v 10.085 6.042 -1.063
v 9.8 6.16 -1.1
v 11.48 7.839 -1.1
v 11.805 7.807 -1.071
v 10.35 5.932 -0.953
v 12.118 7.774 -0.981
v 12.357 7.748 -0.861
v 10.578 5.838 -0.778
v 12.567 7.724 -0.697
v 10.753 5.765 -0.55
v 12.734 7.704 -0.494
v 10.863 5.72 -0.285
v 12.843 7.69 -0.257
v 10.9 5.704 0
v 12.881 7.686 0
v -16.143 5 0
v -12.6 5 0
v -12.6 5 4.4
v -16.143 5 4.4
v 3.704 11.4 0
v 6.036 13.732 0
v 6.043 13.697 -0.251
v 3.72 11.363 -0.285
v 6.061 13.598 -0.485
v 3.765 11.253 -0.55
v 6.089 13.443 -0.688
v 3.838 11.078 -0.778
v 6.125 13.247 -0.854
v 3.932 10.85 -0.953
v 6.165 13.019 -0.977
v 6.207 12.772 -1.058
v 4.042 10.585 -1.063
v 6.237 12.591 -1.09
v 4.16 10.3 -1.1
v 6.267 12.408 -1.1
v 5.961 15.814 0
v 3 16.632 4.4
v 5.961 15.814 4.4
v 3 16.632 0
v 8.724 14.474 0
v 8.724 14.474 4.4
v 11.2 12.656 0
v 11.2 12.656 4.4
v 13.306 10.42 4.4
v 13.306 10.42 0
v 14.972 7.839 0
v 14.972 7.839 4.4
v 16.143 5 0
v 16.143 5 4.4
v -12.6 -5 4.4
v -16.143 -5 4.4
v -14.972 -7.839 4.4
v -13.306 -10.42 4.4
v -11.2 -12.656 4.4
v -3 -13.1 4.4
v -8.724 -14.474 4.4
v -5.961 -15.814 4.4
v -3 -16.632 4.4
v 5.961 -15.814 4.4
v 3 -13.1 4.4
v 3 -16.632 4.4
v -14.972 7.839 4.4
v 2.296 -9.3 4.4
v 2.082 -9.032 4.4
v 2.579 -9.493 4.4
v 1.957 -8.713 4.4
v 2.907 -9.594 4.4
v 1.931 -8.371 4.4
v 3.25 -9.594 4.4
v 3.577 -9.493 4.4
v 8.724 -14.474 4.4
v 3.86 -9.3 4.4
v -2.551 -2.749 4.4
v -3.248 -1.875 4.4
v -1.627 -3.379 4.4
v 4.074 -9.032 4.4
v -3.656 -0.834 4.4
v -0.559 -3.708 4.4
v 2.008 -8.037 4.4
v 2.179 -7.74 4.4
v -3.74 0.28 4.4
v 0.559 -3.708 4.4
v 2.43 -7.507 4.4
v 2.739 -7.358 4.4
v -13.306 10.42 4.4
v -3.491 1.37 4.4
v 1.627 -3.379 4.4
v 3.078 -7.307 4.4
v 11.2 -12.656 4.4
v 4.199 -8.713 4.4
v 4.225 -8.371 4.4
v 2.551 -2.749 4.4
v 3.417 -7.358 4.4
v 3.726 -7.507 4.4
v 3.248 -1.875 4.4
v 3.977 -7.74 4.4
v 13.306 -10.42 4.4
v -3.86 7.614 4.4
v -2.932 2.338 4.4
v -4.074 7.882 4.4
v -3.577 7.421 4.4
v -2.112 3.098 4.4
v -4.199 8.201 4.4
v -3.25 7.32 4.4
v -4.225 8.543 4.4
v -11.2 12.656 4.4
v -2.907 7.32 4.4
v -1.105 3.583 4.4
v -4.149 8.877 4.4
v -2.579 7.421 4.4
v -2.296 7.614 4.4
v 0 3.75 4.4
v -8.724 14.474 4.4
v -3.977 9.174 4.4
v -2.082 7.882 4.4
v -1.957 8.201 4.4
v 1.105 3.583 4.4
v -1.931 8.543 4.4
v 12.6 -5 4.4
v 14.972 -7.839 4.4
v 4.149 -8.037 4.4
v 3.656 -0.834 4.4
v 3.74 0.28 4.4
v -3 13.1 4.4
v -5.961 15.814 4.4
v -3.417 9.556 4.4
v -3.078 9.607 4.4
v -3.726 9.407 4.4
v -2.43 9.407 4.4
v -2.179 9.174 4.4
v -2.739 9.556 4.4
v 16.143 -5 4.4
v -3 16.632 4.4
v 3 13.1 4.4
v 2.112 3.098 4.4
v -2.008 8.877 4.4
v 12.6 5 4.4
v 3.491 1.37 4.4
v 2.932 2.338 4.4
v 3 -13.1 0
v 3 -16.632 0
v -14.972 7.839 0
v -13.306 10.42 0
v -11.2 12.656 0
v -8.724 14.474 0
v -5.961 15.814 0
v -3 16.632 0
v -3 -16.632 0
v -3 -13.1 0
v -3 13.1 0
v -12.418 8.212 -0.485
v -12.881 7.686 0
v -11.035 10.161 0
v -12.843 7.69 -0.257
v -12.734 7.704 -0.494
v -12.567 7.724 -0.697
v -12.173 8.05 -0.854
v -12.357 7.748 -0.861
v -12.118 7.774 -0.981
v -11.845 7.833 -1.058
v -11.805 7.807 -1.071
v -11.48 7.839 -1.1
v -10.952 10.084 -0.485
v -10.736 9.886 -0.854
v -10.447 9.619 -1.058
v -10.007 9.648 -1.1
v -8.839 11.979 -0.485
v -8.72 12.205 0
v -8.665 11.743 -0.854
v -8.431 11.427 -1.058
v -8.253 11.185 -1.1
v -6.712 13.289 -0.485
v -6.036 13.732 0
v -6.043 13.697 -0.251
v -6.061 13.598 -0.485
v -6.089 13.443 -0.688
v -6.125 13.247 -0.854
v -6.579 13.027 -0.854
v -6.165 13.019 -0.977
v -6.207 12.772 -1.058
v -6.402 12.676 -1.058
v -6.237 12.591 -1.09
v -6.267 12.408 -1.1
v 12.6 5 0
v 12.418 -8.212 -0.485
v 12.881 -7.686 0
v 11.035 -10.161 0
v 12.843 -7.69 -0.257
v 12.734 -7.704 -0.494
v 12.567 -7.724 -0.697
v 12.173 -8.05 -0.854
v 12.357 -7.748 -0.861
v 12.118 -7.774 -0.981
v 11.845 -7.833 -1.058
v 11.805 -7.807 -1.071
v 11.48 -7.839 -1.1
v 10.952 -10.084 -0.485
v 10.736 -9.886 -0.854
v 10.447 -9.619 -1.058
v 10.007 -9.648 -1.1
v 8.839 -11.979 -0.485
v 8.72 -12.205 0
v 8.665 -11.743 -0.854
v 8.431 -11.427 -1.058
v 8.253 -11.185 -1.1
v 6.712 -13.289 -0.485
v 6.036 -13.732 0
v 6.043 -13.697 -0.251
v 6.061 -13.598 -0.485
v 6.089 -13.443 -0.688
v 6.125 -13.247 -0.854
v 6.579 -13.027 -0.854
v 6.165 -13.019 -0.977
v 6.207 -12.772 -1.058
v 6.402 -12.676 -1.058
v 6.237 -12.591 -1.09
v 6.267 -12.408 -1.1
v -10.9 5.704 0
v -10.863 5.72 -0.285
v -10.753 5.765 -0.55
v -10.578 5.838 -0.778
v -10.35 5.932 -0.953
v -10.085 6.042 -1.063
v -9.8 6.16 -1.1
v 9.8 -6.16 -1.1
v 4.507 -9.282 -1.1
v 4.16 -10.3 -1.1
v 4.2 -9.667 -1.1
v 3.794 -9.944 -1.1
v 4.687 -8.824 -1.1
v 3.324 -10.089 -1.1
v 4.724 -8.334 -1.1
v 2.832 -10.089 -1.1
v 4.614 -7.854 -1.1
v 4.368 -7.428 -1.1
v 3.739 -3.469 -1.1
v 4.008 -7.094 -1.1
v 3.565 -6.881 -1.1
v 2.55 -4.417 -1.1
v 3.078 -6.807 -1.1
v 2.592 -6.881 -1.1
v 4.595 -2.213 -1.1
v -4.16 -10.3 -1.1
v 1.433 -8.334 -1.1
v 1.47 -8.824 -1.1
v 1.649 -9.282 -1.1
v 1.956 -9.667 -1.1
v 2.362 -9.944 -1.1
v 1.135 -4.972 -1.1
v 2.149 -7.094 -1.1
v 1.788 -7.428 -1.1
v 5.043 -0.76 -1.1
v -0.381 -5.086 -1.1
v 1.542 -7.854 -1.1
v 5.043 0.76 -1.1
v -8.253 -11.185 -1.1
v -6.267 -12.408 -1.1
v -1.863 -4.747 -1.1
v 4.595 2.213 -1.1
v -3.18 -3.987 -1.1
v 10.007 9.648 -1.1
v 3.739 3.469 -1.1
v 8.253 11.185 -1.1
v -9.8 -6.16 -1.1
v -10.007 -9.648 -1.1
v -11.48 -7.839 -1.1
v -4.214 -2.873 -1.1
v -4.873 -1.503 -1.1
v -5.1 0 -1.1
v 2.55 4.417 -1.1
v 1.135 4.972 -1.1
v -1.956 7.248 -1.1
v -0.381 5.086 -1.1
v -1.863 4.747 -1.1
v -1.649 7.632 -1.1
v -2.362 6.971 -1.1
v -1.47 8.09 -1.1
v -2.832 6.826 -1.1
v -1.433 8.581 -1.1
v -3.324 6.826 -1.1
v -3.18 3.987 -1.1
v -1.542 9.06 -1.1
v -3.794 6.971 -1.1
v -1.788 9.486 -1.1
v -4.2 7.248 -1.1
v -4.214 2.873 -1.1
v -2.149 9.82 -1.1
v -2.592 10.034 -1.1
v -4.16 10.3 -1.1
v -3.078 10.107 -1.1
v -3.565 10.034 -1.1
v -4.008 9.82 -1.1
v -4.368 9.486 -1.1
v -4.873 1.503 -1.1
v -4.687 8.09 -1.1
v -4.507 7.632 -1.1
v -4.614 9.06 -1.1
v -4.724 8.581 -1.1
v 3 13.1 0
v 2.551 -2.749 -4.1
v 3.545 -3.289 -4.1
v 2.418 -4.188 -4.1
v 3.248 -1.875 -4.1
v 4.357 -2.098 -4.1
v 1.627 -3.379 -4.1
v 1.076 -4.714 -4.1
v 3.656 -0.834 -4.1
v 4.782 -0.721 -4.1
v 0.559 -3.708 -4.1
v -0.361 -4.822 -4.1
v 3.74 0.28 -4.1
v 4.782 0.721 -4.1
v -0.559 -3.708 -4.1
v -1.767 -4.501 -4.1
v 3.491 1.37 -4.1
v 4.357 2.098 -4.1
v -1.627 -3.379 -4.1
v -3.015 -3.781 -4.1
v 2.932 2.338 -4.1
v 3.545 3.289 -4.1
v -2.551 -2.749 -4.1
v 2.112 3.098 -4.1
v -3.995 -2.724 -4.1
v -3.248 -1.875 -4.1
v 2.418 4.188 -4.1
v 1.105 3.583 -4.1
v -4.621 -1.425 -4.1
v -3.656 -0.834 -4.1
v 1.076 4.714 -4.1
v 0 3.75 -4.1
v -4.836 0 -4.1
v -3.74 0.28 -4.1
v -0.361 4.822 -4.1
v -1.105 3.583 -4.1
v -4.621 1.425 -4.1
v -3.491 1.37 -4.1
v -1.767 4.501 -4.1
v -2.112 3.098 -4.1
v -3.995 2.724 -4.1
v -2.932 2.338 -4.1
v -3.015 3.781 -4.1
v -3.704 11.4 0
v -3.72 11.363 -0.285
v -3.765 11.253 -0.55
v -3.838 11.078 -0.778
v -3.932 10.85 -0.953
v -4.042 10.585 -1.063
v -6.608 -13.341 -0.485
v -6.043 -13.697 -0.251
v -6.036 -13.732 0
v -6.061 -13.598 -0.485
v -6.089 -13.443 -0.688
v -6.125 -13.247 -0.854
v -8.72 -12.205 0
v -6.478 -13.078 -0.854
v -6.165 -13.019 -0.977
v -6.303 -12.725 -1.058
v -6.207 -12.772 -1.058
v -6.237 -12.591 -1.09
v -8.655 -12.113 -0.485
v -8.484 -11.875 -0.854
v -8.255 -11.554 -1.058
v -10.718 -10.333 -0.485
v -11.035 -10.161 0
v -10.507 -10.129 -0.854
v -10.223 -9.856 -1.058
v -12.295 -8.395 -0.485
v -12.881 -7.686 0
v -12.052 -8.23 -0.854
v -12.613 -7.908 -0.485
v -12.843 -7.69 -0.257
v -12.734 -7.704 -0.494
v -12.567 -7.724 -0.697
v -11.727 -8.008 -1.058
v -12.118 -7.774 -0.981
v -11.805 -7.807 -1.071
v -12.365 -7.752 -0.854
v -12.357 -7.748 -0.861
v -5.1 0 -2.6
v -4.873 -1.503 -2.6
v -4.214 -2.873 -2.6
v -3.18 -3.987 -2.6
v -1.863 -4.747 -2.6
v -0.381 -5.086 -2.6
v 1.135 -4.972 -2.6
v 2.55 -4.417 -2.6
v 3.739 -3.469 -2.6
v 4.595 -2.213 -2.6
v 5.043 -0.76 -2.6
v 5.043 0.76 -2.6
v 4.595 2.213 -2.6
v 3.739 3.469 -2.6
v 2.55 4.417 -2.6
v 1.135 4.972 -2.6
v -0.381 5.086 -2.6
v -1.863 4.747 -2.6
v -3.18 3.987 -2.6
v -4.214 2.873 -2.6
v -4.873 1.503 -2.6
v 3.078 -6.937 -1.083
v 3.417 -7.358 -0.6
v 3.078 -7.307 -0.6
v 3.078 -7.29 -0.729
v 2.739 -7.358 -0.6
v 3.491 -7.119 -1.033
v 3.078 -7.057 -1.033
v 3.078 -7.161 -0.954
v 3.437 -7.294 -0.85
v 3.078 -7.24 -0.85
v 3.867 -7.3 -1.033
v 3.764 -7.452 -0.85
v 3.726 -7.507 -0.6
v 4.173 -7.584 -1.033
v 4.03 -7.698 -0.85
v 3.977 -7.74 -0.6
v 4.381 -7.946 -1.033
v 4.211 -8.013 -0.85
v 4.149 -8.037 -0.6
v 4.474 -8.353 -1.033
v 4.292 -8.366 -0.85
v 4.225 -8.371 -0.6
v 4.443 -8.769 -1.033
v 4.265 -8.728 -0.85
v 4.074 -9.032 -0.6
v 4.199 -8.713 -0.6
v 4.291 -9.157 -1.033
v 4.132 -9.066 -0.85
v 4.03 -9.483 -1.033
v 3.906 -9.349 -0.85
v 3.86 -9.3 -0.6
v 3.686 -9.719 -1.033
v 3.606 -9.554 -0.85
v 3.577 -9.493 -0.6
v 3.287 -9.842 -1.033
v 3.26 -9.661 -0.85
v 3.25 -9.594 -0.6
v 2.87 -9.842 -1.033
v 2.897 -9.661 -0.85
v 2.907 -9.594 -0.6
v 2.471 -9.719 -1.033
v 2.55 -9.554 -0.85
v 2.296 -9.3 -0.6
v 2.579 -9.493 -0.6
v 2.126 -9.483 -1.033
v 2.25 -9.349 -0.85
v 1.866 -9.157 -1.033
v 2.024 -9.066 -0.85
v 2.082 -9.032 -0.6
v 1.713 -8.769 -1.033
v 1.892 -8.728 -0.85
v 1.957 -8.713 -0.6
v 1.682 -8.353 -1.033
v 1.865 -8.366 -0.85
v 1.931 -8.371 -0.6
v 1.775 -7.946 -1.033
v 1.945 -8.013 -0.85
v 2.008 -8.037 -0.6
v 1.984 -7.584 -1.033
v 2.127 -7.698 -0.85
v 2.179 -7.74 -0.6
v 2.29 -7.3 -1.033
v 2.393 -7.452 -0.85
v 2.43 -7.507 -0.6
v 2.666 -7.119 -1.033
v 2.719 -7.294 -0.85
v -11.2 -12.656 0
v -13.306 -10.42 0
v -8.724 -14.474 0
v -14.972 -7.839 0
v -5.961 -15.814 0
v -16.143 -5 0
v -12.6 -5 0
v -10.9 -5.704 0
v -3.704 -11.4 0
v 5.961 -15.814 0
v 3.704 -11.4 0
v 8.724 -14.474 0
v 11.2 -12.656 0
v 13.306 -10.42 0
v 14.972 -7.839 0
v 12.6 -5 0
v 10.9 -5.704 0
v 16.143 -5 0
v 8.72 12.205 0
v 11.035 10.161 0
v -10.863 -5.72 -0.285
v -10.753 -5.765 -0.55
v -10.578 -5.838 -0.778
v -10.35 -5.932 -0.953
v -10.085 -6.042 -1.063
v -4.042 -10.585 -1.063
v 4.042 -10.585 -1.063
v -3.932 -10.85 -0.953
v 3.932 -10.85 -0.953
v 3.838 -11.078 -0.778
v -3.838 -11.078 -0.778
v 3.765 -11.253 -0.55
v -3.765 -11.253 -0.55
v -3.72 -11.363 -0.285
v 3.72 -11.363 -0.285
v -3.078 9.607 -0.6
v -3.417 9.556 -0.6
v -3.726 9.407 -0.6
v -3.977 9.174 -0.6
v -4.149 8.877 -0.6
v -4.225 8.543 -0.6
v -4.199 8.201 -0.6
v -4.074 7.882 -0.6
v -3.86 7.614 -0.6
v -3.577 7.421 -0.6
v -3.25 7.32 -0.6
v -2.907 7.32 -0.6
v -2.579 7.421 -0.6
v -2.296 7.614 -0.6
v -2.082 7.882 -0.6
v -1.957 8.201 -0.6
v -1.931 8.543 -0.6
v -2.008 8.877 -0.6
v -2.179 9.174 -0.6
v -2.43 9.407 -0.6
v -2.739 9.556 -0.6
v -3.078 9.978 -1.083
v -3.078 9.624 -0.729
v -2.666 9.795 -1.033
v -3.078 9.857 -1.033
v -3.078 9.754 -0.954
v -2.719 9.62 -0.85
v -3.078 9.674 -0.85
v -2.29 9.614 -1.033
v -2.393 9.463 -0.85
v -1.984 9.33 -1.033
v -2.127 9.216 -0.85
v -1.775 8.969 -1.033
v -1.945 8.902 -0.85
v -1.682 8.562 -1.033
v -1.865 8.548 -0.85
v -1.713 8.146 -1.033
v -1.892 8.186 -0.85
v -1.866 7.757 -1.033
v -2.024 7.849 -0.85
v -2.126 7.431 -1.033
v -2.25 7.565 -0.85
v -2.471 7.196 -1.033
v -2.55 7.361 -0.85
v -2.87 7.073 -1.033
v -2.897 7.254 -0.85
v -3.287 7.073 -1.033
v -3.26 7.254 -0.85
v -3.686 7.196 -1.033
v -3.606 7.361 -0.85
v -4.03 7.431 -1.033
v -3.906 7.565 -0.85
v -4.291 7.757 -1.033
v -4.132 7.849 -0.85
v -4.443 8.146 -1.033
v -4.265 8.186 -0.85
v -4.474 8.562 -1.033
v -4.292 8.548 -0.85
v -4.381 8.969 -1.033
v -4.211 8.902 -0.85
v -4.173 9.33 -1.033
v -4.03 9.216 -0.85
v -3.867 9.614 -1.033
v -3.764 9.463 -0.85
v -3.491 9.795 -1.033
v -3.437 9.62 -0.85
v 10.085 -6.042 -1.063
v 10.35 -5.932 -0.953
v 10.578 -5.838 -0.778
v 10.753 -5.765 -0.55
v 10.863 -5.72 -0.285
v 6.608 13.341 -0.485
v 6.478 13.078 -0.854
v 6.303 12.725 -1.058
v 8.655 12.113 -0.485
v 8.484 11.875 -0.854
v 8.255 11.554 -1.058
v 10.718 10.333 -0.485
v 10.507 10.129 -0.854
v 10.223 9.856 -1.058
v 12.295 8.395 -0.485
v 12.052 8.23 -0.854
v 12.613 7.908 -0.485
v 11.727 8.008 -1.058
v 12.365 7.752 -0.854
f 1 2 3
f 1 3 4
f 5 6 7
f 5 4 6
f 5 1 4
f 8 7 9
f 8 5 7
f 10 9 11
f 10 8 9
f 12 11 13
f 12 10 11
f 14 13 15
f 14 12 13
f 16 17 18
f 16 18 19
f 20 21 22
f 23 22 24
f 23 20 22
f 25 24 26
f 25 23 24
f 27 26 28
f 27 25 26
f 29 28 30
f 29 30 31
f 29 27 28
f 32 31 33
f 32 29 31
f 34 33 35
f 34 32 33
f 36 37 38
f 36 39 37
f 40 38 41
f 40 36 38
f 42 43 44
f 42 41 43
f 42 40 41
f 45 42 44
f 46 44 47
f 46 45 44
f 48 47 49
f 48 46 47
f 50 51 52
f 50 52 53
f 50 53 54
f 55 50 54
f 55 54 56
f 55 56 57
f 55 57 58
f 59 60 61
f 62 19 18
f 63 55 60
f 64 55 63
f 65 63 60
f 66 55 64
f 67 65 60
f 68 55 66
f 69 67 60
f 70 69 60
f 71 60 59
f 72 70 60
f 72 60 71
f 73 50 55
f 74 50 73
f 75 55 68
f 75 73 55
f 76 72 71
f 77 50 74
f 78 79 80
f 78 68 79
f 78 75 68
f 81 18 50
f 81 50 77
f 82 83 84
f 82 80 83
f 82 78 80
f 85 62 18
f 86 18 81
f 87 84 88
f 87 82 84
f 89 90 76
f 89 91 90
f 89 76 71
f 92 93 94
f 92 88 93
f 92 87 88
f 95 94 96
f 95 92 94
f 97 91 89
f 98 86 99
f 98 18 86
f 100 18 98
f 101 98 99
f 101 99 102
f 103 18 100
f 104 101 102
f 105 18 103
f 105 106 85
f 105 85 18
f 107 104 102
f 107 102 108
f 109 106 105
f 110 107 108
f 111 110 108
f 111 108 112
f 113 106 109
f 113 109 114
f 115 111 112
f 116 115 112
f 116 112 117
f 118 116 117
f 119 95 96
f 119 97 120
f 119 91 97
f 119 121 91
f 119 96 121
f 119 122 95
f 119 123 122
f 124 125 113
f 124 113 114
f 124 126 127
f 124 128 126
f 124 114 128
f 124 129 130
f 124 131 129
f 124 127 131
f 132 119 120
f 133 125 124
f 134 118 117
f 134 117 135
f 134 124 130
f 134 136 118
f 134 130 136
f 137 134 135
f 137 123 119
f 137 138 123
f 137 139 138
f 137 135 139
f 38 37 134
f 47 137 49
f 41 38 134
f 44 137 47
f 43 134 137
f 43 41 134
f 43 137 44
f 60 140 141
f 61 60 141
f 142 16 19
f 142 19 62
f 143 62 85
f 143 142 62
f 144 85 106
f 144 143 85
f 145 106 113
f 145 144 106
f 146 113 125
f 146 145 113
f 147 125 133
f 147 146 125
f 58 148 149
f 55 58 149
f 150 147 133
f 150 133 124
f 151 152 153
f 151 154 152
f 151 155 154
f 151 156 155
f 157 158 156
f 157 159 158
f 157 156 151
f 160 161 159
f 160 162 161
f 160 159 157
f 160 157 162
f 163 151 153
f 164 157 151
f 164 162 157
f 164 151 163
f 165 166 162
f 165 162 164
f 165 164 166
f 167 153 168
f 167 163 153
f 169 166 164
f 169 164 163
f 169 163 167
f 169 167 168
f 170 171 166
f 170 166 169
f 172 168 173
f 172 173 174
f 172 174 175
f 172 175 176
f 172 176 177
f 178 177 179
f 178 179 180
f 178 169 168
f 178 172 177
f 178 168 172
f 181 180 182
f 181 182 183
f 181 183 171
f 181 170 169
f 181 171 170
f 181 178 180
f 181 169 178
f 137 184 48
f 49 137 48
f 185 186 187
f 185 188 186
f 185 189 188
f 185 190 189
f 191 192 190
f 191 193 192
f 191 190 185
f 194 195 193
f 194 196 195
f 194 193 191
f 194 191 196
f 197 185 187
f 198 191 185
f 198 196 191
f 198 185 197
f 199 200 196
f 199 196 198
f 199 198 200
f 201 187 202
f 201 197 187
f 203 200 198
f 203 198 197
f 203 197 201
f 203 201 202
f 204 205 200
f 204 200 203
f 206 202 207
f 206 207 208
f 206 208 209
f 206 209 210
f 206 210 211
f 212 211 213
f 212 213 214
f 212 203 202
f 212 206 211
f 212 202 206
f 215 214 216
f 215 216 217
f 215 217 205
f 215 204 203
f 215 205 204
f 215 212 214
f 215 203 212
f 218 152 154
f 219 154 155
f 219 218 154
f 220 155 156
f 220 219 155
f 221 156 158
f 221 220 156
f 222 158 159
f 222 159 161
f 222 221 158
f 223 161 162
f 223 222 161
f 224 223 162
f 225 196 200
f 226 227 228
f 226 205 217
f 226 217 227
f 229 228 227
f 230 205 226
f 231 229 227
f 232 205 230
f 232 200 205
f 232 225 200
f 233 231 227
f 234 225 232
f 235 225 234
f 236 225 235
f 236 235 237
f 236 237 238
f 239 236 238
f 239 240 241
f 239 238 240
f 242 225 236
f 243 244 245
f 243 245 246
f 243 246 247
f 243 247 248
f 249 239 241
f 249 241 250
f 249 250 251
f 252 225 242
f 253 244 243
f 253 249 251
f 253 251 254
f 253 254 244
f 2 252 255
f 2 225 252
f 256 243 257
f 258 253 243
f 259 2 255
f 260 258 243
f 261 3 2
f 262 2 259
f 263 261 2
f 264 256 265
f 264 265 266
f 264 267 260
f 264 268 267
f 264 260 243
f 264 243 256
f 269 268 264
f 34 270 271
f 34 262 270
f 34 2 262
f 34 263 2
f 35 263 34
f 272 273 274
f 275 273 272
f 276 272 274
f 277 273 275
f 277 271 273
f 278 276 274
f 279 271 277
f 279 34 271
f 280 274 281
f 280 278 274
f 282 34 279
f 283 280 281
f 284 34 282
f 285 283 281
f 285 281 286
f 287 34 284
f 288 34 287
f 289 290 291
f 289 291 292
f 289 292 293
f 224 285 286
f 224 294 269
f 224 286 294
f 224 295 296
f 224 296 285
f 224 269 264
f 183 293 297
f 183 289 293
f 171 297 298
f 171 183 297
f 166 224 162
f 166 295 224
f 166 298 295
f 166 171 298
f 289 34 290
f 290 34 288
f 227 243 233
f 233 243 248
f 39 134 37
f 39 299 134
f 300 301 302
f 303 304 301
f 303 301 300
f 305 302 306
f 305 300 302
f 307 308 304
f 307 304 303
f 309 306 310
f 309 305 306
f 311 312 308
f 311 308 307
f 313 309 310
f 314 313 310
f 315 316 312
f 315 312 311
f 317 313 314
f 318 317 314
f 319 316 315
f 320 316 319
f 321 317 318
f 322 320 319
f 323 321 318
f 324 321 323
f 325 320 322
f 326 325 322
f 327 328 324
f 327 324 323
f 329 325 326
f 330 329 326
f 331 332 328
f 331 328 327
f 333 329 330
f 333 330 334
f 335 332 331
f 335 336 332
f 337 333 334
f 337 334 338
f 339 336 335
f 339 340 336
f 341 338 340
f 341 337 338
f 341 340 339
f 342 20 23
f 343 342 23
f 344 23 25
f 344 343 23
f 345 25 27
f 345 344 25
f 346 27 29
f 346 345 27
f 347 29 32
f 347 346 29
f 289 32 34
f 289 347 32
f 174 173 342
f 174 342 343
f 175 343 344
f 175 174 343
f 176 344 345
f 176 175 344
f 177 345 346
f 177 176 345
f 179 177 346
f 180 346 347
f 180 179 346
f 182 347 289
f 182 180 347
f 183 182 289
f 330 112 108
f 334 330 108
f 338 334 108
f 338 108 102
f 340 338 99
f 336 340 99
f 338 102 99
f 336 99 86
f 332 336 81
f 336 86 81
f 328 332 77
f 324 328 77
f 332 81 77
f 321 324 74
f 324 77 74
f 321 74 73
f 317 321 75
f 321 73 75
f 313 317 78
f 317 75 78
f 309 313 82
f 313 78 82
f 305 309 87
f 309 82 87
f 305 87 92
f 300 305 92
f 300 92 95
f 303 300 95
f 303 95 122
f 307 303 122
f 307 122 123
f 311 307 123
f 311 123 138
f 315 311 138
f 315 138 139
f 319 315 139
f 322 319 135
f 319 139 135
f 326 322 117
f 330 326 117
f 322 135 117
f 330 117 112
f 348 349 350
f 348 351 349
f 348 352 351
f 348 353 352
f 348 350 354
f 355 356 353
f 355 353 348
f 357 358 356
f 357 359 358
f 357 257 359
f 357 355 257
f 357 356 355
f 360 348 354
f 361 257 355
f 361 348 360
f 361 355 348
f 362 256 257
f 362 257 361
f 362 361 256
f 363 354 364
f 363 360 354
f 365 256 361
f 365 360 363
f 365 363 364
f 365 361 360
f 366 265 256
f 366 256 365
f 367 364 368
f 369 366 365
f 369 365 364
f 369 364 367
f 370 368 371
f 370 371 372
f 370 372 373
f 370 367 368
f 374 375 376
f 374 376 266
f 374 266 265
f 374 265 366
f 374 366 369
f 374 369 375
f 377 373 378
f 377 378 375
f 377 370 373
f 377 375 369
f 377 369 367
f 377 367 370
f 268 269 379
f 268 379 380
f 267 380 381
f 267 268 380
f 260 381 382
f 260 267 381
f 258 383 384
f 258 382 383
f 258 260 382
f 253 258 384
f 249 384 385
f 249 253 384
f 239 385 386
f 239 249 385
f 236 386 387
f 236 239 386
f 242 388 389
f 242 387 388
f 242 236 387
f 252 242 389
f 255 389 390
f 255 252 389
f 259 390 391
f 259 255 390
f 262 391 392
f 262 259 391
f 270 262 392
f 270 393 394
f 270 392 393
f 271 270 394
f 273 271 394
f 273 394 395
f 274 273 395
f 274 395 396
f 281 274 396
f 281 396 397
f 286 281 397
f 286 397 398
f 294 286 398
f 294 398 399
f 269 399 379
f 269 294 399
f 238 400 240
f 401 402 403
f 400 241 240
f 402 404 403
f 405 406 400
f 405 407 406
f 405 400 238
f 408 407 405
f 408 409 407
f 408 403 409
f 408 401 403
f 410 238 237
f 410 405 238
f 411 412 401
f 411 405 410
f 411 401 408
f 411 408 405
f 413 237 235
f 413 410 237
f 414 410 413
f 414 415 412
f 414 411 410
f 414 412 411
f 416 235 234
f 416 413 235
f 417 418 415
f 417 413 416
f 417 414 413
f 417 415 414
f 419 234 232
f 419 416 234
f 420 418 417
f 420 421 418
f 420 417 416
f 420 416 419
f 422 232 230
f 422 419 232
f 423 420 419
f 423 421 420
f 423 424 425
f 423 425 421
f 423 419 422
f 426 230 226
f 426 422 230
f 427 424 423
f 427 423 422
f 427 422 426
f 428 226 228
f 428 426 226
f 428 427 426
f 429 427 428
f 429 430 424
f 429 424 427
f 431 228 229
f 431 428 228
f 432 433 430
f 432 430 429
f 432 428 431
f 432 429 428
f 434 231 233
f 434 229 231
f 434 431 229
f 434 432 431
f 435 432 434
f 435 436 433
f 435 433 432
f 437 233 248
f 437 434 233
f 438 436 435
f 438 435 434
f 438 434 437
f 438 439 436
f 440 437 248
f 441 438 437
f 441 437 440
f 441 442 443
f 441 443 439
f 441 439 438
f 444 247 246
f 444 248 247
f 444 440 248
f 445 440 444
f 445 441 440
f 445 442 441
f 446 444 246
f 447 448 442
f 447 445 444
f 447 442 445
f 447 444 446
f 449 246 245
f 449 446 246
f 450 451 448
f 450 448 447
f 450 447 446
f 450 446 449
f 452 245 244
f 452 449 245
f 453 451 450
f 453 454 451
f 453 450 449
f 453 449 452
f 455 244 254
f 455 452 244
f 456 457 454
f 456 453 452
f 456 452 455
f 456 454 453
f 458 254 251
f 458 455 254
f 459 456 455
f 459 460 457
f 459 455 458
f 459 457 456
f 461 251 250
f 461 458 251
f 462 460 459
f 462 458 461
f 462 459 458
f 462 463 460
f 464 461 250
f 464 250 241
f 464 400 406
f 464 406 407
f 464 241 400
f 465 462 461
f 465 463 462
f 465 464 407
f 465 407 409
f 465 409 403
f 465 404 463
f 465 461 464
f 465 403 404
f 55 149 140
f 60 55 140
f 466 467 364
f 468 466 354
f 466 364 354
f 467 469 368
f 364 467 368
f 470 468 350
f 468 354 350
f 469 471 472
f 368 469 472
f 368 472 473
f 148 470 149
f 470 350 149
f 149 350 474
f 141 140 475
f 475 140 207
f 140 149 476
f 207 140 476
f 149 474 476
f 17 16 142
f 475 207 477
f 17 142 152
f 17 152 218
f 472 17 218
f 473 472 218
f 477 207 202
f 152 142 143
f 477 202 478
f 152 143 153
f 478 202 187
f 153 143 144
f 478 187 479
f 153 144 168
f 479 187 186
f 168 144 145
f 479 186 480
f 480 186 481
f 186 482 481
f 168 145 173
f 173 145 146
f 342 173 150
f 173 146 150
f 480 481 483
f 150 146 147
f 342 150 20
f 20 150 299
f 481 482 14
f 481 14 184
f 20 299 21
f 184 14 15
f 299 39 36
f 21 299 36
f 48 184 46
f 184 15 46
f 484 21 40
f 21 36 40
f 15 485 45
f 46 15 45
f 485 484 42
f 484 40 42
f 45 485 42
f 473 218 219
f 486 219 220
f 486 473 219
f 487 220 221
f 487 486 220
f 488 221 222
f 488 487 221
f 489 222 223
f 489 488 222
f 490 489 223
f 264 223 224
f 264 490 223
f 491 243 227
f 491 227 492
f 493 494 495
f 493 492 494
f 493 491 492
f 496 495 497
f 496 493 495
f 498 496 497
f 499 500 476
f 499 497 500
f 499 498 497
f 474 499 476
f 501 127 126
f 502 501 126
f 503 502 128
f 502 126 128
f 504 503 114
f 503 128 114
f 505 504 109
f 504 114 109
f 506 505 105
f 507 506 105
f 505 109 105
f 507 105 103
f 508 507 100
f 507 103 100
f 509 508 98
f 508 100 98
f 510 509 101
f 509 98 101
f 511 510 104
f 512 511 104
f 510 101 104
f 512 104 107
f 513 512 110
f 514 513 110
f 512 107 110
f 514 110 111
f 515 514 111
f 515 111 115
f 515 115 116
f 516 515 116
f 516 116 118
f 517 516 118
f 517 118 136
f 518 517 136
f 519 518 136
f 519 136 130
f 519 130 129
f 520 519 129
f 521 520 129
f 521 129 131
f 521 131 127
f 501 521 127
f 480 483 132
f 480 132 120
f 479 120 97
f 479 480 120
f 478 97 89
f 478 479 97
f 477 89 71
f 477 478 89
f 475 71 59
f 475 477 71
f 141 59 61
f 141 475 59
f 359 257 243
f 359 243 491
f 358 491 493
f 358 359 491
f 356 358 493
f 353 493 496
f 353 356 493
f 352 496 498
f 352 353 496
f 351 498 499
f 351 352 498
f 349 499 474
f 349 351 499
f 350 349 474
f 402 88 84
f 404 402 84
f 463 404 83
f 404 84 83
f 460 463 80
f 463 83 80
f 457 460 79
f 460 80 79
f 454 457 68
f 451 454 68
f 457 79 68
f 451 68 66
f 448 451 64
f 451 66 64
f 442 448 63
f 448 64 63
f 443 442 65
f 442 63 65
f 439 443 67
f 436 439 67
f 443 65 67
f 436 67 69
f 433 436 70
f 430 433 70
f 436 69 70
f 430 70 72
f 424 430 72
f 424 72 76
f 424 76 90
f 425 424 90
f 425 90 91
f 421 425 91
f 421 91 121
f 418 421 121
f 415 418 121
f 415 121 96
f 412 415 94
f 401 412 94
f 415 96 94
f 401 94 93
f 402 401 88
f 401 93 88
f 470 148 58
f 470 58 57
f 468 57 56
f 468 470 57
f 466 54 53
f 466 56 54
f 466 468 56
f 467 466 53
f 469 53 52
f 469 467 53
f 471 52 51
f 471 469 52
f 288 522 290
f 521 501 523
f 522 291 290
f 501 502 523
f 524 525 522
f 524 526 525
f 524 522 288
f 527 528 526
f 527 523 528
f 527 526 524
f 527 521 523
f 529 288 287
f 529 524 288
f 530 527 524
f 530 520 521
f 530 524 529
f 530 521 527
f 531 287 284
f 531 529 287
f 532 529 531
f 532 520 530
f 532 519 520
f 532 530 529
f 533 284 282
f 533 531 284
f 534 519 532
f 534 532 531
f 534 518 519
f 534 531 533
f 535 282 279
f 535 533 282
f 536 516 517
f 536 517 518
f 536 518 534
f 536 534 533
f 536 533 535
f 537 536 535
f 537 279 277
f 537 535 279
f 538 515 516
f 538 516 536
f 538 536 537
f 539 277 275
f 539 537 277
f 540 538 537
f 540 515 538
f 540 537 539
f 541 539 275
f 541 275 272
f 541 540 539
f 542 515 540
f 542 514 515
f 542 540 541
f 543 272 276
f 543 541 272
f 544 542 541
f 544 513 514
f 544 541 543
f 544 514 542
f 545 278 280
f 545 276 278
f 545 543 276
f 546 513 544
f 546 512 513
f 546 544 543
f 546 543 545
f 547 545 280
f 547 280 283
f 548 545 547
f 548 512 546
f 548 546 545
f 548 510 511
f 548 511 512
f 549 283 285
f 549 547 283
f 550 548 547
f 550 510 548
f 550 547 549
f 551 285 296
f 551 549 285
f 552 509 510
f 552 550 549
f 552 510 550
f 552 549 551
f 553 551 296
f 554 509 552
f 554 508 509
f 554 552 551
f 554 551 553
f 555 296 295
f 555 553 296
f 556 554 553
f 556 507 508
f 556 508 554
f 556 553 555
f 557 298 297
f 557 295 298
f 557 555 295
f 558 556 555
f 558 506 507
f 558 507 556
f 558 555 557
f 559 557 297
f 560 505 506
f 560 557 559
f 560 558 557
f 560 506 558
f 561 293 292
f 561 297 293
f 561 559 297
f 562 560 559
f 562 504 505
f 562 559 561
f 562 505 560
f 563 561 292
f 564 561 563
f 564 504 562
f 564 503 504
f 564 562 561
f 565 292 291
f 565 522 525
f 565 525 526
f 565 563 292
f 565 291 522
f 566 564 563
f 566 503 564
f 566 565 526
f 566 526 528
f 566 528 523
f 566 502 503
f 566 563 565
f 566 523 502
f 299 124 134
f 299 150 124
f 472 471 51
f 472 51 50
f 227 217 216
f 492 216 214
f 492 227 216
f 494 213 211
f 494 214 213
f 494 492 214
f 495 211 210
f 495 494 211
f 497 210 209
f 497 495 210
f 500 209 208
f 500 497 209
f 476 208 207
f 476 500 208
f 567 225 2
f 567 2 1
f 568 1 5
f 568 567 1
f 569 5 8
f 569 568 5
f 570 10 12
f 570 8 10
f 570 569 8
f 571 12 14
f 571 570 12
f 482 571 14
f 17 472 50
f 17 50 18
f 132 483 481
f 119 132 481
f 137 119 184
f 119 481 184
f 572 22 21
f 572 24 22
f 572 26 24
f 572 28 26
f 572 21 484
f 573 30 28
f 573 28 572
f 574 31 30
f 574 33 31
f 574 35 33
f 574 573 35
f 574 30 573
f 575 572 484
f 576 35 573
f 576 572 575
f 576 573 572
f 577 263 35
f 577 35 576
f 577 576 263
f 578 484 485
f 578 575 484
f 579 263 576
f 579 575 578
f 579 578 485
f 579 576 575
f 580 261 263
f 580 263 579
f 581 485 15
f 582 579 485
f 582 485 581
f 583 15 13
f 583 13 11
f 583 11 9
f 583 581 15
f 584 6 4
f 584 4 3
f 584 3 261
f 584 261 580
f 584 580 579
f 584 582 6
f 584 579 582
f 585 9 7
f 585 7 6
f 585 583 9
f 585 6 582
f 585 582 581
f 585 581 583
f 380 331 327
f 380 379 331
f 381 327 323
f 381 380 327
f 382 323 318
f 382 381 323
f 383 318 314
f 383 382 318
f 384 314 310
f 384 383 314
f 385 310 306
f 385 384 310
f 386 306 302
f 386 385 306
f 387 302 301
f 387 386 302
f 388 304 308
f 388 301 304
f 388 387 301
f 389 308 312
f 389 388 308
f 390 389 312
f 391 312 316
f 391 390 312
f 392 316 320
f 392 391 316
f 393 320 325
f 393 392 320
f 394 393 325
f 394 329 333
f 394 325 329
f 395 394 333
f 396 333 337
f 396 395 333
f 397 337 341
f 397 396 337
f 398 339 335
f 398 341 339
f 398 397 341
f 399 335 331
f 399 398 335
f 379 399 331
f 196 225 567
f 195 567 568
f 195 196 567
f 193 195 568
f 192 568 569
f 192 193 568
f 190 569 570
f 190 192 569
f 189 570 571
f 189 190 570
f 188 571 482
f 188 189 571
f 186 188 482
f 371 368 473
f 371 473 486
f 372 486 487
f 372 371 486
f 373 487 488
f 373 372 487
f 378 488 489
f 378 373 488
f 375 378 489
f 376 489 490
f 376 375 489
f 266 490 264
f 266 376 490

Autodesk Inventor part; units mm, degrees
ref_plane "YZ Plane" through (0, 0, 0) normal (1, 0, 0) x (0, 1, 0)
ref_plane "XZ Plane" through (0, 0, 0) normal (0, 1, 0) x (-1, 0, 0)
ref_plane "XY Plane" through (0, 0, 0) normal (0, 0, 1) x (1, 0, 0)
sketch "スケッチ1" plane through (0, 0, 0) normal (0, 0, 1) x (1, 0, 0)
  circle A0 centre (0, 0) radius 16.9
  line L0 (-3, 13.1) -> (3, 13.1)
  line L1 (3, 13.1) -> (3, 16.9)
  line L2 (3, 16.9) -> (-3, 16.9)
  line L3 (-3, 16.9) -> (-3, 13.1)
  line L4 (-12.6, 5) -> (-16.9, 5)
  line L5 (-16.9, 5) -> (-16.9, -5)
  line L6 (-16.9, -5) -> (-12.6, -5)
  line L7 (-12.6, -5) -> (-12.6, 5)
  line L8 (16.9, 0) -> (-16.9, 0) construction
  line L9 (0, 16.9) -> (0, -16.9) construction
  line L10 (-3, -13.1) -> (3, -13.1)
  line L11 (3, -13.1) -> (3, -16.9)
  line L12 (3, -16.9) -> (-3, -16.9)
  line L13 (-3, -16.9) -> (-3, -13.1)
  line L14 (12.6, 5) -> (16.9, 5)
  line L15 (16.9, 5) -> (16.9, -5)
  line L16 (16.9, -5) -> (12.6, -5)
  line L17 (12.6, -5) -> (12.6, 5)
  point P0 (-12.6, 0)
  point P1 (0, 13.1)
  point P2 (-3, 16.6316)
  point P3 (-16.1434, 5)
  point P4 (-16.1434, -5)
  point P5 (-3, -16.6316)
  point P6 (3, -16.6316)
  point P7 (16.1434, -5)
  point P8 (16.1434, 5)
  point P9 (3, 16.6316)
  dimension "d0" = 33.8
  dimension "d1" = 6
  dimension "d2" = 10
  dimension "d3" = 3.8
  dimension "d4" = 4.3
extrude "押し出し1" add sketch "スケッチ1" along normal blind 4.4 contours L14 L17 L16 A0 L11 L10 L13 L6 L7 L4 L3 L0 L1
sketch "スケッチ2" plane through (0, 0, 0) normal (0, 0, -1) x (-1, 0, 0)
  circle A0 centre (0, 0) radius 15
  line L0 (12.8814, 7.6856) -> (10.9, 5.7042)
  line L1 (10.9, 5.7042) -> (10.9, -5.7042)
  line L2 (10.9, -5.7042) -> (12.8814, -7.6856)
  line L3 (12.6, 5) -> (12.6, -5) projected
  line L4 (15, 0) -> (-15, 0) construction
  line L5 (-6.0361, 13.7319) -> (-3.7042, 11.4)
  line L6 (-3.7042, 11.4) -> (3.7042, 11.4)
  line L7 (3.7042, 11.4) -> (6.0361, 13.7319)
  line L8 (0, 15) -> (0, -15) construction
  line L9 (-3, 13.1) -> (3, 13.1) projected
  line L10 (-12.8814, 7.6856) -> (-10.9, 5.7042)
  line L11 (-10.9, 5.7042) -> (-10.9, -5.7042)
  line L12 (-10.9, -5.7042) -> (-12.8814, -7.6856)
  line L13 (-6.0361, -13.7319) -> (-3.7042, -11.4)
  line L14 (-3.7042, -11.4) -> (3.7042, -11.4)
  line L15 (3.7042, -11.4) -> (6.0361, -13.7319)
  point P0 (-12.8814, 7.6856)
  point P1 (-12.8814, -7.6856)
  point P2 (-6.0361, -13.7319)
  point P3 (6.0361, -13.7319)
  dimension "d7" = 30
  dimension "d8" = 1.7
  dimension "d9" = 135
  dimension "d10" = 1.7
  dimension "d11" = 1.7
  dimension "d12" = 1.7
  dimension "d13" = 135
extrude "押し出し2" add sketch "スケッチ2" along normal blind 1.1 contours L0 L1 L2 A0 L15 L14 L13 L12 L11 L10 L5 L6 L7
sketch "スケッチ3" plane through (0, 0, -1.1) normal (0, 0, -1) x (-1, 0, 0)
  circle A0 centre (0, 0) radius 5.1
  dimension "d16" = 10.2
extrude "押し出し3" add sketch "スケッチ3" along normal blind 3
sketch "スケッチ4" plane through (0, 0, -4.1) normal (0, 0, -1) x (-1, 0, 0)
  point P0 (0, 0)
  point P1 (0, 0)
hole "穴1" at (0, 0, -4.1) direction (0, 0, 1) diameter 7.5 end through all
fillet "フィレット1" radius 1.1 16 edges at (-11.8907, 6.6949, -1.1) (-9.9301, 11.2424, -1.1) (-4.8701, 12.566, -1.1) (0, 11.4, -1.1) (4.8701, 12.566, -1.1) (9.9301, 11.2424, -1.1) (11.8907, 6.6949, -1.1) (10.9, 0, -1.1) (11.8907, -6.6949, -1.1) (9.9301, -11.2424, -1.1) (4.8701, -12.566, -1.1) (0, -11.4, -1.1) (-4.8701, -12.566, -1.1) (-9.9301, -11.2424, -1.1) (-11.8907, -6.6949, -1.1) (-10.9, 0, -1.1)
chamfer "面取り1" distance 1.5 angle 10 1 edges at (5.1, 0, -4.1) measured on face at (-5.0835, -0.4104, -3.1)
sketch "スケッチ5" plane through (0, 0, -1.1) normal (0, 0, -1) x (-1, 0, 0)
  line L0 (-3.0782, -8.4572) -> (3.0782, 8.4572)
  line L1 (0, -23.2842) -> (0, 23.2842) projected
  point P0 (0, 0)
  point P1 (0, 0)
  dimension "d30" = 18
  dimension "d31" = 20
hole "穴2" at (-3.0782, 8.4572, -1.1) at (3.0782, -8.4572, -1.1) direction (0, 0, 1) diameter 2.3 end through all
fillet "フィレット2" radius 0.5 2 edges at (3.0782, -9.6072, -1.1) (-3.0782, 7.3072, -1.1)
properties part number "555_Cap" material "鉄、鋳鉄"
